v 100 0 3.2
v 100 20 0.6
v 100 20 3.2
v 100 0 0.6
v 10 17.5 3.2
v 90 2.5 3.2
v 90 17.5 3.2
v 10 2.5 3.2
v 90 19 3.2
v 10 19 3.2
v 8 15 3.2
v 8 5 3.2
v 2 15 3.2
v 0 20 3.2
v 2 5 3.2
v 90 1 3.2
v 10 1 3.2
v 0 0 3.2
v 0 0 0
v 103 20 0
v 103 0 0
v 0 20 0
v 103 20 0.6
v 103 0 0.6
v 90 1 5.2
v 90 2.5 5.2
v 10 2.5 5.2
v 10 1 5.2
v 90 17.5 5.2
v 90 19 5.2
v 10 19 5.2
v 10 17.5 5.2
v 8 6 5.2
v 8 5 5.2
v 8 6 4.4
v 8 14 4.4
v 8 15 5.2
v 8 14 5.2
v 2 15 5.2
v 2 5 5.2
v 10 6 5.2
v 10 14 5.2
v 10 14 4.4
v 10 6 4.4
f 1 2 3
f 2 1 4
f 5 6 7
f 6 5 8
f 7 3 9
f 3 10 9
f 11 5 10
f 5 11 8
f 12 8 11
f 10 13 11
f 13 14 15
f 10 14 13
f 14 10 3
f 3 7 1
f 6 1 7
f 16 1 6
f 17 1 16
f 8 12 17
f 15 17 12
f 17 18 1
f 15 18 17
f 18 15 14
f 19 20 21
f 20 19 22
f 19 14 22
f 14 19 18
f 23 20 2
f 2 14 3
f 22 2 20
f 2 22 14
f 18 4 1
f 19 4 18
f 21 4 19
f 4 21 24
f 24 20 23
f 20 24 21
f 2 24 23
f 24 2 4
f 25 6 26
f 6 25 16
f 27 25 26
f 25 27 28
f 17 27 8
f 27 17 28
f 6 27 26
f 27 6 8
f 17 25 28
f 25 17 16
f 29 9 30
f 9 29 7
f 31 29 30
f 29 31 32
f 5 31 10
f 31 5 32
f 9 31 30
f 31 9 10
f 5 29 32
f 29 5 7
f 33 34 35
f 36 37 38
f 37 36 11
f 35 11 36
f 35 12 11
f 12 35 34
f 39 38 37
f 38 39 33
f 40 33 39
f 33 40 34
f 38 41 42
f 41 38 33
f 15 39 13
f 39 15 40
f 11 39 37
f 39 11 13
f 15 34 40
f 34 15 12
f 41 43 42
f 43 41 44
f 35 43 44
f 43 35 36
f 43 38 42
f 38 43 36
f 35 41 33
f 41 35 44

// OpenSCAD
// Bag clip with living hinge - PETG, 0.4mm nozzle, no supports
// Printed open flat (two arms end-to-end), closes by folding 180deg about Y.
// Lower arm at origin, upper arm local origin at its hinge edge.

part = "arm_lower"; // [arm_lower, arm_upper, assembly]
cadverify_only = "";

/* Dimensions (mm) */
Lbody = 100;      // arm body length
Wbody = 20;       // arm width
Tbody = 3.2;      // arm thickness
Hhinge = 6;       // total hinge length (gap between bodies)
Hhalf = 3;        // hinge half length per arm
Thinge = 0.6;     // hinge thickness
Bgap = 2.0;       // bag thickness / closed gap
Ttot = Tbody + Bgap; // 5.2 closed inner top
Zpiv = Tbody + Bgap/2; // 4.2 pivot height
Xpiv = Lbody + Hhalf;  // 103 pivot X in assembly

module instance(name, part, unit = 1) {
    echo(cadverify_instance = [name, part, unit]);
    if (cadverify_only == "" || cadverify_only == name) children();
}

// ---------- lower arm geometry (print orientation, min at 0) ----------
module arm_lower() {
    // body
    cube([Lbody, Wbody, Tbody], false);
    // hinge half (thin, on bed), overlap 0.1 into body
    translate([Lbody-0.1, 0, 0])
        cube([Hhalf+0.1, Wbody, Thinge], false);
    // (no heel: the ribs and latch towers are the close stop)
    // ribs (2mm tall standoff), overlap 0.1 into body
    translate([10, 1, Tbody-0.1])
        cube([80, 1.5, Bgap+0.1], false);
    translate([10, 17.5, Tbody-0.1])
        cube([80, 1.5, Bgap+0.1], false);
    // latch tower, overlap into body
    translate([2, 5, Tbody-0.1])
        cube([6, 10, Bgap+0.1], false);
    // latch lip (cantilever +X), overlap into tower
    translate([7.9, 6, 4.4])
        cube([2.1, 8, 0.8], false);
}

// ---------- upper arm geometry (print orientation, hinge at x=0) ----------
module arm_upper() {
    // hinge half on bed
    cube([Hhalf+0.1, Wbody, Thinge], false);
    // body, overlap into hinge
    translate([Hhalf-0.1, 0, 0])
        cube([Lbody+0.1, Wbody, Tbody], false);
    // latch tower (maps to closed x=12-18), overlap into body
    translate([85, 5, Tbody-0.1])
        cube([6, 10, Bgap+0.1], false);
    // latch lip (extends +X toward free end), overlap into tower
    translate([90.9, 6, 4.2])
        cube([2.5, 8, 1.0], false);
    // thumb tab beyond free end, same thickness as body, overlap
    translate([102.9, 6, 0])
        cube([8.1, 8, Tbody], false);
}

// ---------- part / assembly dispatch ----------
if (part == "arm_lower") {
    echo(cadverify_spec = [
        ["bounds", [[0, 0, 0], [103, 20, 5.2]]],
        ["bodies", 1],
        ["through_holes", 0],
        ["support_faces", [["bed", "-z", 1500]]],
        ["overhangs_allowed", [["latch lip", [[7.5, 5.5, 4.0], [10.5, 14.5, 5.5]]]]],
        ["copies", 1],
        ["details", [
            ["arm", "material", [[20, 6, 1.0], [80, 14, 2.2]], 1],
            ["arm_wall", "thickness", [50, 10, 10], [0, 0, -1], 3.2],
            ["hinge", "thickness", [101.5, 10, 5], [0, 0, -1], 0.6],
            ["rib", "material", [[20, 1.2, 3.5], [80, 2.3, 5.0]], 1],
            ["latch_tower", "material", [[3, 6, 3.5], [7, 14, 5.0]], 1],
            ["latch_lip", "material", [[8.3, 7, 4.6], [9.6, 13, 5.0]], 1],
            ["bag_slot", "void", [[20, 3, 3.5], [80, 17, 5.0]], 1]
        ]]
    ]);
    arm_lower();
} else if (part == "arm_upper") {
    echo(cadverify_spec = [
        ["bounds", [[0, 0, 0], [111, 20, 5.2]]],
        ["bodies", 1],
        ["through_holes", 0],
        ["support_faces", [["bed", "-z", 1500]]],
        ["overhangs_allowed", [["latch lip", [[90.5, 5.5, 4.0], [94.5, 14.5, 5.5]]]]],
        ["copies", 1],
        ["details", [
            ["arm", "material", [[10, 6, 1.0], [80, 14, 2.2]], 1],
            ["arm_wall", "thickness", [50, 10, 10], [0, 0, -1], 3.2],
            ["hinge", "thickness", [1.5, 10, 5], [0, 0, -1], 0.6],
            ["latch_tower", "material", [[86, 6, 3.5], [90, 14, 5.0]], 1],
            ["latch_lip", "material", [[91.3, 7, 4.4], [93.0, 13, 5.0]], 1],
            ["thumb_tab", "material", [[104, 7, 1.0], [110, 13, 2.2]], 1],
            ["field", "void", [[10, 3, 3.5], [80, 17, 5.0]], 1]
        ]]
    ]);
    arm_upper();
} else if (part == "assembly") {
    echo(cadverify_spec = [
        ["bounds", [[0, 0, 0], [214, 20, 5.2]]],
        ["support_faces", [["bed", "-z", 3000]]],
        ["motions", [
            ["close", ["upper"], "rotate", [103, 10, 4.2], [0, -1, 0], [0, 180],
                ["flex", [["upper", "lower", 1.0, "latch snap"]]],
                ["stops", [180]]
            ]
        ]],
        ["assembly_order", [
            [["lower"], [0, 0, 0]],
            [["upper"], [0, 0, -1]]
        ]]
    ]);
    instance("lower", "arm_lower") arm_lower();
    instance("upper", "arm_upper") translate([103, 0, 0]) arm_upper();
}
